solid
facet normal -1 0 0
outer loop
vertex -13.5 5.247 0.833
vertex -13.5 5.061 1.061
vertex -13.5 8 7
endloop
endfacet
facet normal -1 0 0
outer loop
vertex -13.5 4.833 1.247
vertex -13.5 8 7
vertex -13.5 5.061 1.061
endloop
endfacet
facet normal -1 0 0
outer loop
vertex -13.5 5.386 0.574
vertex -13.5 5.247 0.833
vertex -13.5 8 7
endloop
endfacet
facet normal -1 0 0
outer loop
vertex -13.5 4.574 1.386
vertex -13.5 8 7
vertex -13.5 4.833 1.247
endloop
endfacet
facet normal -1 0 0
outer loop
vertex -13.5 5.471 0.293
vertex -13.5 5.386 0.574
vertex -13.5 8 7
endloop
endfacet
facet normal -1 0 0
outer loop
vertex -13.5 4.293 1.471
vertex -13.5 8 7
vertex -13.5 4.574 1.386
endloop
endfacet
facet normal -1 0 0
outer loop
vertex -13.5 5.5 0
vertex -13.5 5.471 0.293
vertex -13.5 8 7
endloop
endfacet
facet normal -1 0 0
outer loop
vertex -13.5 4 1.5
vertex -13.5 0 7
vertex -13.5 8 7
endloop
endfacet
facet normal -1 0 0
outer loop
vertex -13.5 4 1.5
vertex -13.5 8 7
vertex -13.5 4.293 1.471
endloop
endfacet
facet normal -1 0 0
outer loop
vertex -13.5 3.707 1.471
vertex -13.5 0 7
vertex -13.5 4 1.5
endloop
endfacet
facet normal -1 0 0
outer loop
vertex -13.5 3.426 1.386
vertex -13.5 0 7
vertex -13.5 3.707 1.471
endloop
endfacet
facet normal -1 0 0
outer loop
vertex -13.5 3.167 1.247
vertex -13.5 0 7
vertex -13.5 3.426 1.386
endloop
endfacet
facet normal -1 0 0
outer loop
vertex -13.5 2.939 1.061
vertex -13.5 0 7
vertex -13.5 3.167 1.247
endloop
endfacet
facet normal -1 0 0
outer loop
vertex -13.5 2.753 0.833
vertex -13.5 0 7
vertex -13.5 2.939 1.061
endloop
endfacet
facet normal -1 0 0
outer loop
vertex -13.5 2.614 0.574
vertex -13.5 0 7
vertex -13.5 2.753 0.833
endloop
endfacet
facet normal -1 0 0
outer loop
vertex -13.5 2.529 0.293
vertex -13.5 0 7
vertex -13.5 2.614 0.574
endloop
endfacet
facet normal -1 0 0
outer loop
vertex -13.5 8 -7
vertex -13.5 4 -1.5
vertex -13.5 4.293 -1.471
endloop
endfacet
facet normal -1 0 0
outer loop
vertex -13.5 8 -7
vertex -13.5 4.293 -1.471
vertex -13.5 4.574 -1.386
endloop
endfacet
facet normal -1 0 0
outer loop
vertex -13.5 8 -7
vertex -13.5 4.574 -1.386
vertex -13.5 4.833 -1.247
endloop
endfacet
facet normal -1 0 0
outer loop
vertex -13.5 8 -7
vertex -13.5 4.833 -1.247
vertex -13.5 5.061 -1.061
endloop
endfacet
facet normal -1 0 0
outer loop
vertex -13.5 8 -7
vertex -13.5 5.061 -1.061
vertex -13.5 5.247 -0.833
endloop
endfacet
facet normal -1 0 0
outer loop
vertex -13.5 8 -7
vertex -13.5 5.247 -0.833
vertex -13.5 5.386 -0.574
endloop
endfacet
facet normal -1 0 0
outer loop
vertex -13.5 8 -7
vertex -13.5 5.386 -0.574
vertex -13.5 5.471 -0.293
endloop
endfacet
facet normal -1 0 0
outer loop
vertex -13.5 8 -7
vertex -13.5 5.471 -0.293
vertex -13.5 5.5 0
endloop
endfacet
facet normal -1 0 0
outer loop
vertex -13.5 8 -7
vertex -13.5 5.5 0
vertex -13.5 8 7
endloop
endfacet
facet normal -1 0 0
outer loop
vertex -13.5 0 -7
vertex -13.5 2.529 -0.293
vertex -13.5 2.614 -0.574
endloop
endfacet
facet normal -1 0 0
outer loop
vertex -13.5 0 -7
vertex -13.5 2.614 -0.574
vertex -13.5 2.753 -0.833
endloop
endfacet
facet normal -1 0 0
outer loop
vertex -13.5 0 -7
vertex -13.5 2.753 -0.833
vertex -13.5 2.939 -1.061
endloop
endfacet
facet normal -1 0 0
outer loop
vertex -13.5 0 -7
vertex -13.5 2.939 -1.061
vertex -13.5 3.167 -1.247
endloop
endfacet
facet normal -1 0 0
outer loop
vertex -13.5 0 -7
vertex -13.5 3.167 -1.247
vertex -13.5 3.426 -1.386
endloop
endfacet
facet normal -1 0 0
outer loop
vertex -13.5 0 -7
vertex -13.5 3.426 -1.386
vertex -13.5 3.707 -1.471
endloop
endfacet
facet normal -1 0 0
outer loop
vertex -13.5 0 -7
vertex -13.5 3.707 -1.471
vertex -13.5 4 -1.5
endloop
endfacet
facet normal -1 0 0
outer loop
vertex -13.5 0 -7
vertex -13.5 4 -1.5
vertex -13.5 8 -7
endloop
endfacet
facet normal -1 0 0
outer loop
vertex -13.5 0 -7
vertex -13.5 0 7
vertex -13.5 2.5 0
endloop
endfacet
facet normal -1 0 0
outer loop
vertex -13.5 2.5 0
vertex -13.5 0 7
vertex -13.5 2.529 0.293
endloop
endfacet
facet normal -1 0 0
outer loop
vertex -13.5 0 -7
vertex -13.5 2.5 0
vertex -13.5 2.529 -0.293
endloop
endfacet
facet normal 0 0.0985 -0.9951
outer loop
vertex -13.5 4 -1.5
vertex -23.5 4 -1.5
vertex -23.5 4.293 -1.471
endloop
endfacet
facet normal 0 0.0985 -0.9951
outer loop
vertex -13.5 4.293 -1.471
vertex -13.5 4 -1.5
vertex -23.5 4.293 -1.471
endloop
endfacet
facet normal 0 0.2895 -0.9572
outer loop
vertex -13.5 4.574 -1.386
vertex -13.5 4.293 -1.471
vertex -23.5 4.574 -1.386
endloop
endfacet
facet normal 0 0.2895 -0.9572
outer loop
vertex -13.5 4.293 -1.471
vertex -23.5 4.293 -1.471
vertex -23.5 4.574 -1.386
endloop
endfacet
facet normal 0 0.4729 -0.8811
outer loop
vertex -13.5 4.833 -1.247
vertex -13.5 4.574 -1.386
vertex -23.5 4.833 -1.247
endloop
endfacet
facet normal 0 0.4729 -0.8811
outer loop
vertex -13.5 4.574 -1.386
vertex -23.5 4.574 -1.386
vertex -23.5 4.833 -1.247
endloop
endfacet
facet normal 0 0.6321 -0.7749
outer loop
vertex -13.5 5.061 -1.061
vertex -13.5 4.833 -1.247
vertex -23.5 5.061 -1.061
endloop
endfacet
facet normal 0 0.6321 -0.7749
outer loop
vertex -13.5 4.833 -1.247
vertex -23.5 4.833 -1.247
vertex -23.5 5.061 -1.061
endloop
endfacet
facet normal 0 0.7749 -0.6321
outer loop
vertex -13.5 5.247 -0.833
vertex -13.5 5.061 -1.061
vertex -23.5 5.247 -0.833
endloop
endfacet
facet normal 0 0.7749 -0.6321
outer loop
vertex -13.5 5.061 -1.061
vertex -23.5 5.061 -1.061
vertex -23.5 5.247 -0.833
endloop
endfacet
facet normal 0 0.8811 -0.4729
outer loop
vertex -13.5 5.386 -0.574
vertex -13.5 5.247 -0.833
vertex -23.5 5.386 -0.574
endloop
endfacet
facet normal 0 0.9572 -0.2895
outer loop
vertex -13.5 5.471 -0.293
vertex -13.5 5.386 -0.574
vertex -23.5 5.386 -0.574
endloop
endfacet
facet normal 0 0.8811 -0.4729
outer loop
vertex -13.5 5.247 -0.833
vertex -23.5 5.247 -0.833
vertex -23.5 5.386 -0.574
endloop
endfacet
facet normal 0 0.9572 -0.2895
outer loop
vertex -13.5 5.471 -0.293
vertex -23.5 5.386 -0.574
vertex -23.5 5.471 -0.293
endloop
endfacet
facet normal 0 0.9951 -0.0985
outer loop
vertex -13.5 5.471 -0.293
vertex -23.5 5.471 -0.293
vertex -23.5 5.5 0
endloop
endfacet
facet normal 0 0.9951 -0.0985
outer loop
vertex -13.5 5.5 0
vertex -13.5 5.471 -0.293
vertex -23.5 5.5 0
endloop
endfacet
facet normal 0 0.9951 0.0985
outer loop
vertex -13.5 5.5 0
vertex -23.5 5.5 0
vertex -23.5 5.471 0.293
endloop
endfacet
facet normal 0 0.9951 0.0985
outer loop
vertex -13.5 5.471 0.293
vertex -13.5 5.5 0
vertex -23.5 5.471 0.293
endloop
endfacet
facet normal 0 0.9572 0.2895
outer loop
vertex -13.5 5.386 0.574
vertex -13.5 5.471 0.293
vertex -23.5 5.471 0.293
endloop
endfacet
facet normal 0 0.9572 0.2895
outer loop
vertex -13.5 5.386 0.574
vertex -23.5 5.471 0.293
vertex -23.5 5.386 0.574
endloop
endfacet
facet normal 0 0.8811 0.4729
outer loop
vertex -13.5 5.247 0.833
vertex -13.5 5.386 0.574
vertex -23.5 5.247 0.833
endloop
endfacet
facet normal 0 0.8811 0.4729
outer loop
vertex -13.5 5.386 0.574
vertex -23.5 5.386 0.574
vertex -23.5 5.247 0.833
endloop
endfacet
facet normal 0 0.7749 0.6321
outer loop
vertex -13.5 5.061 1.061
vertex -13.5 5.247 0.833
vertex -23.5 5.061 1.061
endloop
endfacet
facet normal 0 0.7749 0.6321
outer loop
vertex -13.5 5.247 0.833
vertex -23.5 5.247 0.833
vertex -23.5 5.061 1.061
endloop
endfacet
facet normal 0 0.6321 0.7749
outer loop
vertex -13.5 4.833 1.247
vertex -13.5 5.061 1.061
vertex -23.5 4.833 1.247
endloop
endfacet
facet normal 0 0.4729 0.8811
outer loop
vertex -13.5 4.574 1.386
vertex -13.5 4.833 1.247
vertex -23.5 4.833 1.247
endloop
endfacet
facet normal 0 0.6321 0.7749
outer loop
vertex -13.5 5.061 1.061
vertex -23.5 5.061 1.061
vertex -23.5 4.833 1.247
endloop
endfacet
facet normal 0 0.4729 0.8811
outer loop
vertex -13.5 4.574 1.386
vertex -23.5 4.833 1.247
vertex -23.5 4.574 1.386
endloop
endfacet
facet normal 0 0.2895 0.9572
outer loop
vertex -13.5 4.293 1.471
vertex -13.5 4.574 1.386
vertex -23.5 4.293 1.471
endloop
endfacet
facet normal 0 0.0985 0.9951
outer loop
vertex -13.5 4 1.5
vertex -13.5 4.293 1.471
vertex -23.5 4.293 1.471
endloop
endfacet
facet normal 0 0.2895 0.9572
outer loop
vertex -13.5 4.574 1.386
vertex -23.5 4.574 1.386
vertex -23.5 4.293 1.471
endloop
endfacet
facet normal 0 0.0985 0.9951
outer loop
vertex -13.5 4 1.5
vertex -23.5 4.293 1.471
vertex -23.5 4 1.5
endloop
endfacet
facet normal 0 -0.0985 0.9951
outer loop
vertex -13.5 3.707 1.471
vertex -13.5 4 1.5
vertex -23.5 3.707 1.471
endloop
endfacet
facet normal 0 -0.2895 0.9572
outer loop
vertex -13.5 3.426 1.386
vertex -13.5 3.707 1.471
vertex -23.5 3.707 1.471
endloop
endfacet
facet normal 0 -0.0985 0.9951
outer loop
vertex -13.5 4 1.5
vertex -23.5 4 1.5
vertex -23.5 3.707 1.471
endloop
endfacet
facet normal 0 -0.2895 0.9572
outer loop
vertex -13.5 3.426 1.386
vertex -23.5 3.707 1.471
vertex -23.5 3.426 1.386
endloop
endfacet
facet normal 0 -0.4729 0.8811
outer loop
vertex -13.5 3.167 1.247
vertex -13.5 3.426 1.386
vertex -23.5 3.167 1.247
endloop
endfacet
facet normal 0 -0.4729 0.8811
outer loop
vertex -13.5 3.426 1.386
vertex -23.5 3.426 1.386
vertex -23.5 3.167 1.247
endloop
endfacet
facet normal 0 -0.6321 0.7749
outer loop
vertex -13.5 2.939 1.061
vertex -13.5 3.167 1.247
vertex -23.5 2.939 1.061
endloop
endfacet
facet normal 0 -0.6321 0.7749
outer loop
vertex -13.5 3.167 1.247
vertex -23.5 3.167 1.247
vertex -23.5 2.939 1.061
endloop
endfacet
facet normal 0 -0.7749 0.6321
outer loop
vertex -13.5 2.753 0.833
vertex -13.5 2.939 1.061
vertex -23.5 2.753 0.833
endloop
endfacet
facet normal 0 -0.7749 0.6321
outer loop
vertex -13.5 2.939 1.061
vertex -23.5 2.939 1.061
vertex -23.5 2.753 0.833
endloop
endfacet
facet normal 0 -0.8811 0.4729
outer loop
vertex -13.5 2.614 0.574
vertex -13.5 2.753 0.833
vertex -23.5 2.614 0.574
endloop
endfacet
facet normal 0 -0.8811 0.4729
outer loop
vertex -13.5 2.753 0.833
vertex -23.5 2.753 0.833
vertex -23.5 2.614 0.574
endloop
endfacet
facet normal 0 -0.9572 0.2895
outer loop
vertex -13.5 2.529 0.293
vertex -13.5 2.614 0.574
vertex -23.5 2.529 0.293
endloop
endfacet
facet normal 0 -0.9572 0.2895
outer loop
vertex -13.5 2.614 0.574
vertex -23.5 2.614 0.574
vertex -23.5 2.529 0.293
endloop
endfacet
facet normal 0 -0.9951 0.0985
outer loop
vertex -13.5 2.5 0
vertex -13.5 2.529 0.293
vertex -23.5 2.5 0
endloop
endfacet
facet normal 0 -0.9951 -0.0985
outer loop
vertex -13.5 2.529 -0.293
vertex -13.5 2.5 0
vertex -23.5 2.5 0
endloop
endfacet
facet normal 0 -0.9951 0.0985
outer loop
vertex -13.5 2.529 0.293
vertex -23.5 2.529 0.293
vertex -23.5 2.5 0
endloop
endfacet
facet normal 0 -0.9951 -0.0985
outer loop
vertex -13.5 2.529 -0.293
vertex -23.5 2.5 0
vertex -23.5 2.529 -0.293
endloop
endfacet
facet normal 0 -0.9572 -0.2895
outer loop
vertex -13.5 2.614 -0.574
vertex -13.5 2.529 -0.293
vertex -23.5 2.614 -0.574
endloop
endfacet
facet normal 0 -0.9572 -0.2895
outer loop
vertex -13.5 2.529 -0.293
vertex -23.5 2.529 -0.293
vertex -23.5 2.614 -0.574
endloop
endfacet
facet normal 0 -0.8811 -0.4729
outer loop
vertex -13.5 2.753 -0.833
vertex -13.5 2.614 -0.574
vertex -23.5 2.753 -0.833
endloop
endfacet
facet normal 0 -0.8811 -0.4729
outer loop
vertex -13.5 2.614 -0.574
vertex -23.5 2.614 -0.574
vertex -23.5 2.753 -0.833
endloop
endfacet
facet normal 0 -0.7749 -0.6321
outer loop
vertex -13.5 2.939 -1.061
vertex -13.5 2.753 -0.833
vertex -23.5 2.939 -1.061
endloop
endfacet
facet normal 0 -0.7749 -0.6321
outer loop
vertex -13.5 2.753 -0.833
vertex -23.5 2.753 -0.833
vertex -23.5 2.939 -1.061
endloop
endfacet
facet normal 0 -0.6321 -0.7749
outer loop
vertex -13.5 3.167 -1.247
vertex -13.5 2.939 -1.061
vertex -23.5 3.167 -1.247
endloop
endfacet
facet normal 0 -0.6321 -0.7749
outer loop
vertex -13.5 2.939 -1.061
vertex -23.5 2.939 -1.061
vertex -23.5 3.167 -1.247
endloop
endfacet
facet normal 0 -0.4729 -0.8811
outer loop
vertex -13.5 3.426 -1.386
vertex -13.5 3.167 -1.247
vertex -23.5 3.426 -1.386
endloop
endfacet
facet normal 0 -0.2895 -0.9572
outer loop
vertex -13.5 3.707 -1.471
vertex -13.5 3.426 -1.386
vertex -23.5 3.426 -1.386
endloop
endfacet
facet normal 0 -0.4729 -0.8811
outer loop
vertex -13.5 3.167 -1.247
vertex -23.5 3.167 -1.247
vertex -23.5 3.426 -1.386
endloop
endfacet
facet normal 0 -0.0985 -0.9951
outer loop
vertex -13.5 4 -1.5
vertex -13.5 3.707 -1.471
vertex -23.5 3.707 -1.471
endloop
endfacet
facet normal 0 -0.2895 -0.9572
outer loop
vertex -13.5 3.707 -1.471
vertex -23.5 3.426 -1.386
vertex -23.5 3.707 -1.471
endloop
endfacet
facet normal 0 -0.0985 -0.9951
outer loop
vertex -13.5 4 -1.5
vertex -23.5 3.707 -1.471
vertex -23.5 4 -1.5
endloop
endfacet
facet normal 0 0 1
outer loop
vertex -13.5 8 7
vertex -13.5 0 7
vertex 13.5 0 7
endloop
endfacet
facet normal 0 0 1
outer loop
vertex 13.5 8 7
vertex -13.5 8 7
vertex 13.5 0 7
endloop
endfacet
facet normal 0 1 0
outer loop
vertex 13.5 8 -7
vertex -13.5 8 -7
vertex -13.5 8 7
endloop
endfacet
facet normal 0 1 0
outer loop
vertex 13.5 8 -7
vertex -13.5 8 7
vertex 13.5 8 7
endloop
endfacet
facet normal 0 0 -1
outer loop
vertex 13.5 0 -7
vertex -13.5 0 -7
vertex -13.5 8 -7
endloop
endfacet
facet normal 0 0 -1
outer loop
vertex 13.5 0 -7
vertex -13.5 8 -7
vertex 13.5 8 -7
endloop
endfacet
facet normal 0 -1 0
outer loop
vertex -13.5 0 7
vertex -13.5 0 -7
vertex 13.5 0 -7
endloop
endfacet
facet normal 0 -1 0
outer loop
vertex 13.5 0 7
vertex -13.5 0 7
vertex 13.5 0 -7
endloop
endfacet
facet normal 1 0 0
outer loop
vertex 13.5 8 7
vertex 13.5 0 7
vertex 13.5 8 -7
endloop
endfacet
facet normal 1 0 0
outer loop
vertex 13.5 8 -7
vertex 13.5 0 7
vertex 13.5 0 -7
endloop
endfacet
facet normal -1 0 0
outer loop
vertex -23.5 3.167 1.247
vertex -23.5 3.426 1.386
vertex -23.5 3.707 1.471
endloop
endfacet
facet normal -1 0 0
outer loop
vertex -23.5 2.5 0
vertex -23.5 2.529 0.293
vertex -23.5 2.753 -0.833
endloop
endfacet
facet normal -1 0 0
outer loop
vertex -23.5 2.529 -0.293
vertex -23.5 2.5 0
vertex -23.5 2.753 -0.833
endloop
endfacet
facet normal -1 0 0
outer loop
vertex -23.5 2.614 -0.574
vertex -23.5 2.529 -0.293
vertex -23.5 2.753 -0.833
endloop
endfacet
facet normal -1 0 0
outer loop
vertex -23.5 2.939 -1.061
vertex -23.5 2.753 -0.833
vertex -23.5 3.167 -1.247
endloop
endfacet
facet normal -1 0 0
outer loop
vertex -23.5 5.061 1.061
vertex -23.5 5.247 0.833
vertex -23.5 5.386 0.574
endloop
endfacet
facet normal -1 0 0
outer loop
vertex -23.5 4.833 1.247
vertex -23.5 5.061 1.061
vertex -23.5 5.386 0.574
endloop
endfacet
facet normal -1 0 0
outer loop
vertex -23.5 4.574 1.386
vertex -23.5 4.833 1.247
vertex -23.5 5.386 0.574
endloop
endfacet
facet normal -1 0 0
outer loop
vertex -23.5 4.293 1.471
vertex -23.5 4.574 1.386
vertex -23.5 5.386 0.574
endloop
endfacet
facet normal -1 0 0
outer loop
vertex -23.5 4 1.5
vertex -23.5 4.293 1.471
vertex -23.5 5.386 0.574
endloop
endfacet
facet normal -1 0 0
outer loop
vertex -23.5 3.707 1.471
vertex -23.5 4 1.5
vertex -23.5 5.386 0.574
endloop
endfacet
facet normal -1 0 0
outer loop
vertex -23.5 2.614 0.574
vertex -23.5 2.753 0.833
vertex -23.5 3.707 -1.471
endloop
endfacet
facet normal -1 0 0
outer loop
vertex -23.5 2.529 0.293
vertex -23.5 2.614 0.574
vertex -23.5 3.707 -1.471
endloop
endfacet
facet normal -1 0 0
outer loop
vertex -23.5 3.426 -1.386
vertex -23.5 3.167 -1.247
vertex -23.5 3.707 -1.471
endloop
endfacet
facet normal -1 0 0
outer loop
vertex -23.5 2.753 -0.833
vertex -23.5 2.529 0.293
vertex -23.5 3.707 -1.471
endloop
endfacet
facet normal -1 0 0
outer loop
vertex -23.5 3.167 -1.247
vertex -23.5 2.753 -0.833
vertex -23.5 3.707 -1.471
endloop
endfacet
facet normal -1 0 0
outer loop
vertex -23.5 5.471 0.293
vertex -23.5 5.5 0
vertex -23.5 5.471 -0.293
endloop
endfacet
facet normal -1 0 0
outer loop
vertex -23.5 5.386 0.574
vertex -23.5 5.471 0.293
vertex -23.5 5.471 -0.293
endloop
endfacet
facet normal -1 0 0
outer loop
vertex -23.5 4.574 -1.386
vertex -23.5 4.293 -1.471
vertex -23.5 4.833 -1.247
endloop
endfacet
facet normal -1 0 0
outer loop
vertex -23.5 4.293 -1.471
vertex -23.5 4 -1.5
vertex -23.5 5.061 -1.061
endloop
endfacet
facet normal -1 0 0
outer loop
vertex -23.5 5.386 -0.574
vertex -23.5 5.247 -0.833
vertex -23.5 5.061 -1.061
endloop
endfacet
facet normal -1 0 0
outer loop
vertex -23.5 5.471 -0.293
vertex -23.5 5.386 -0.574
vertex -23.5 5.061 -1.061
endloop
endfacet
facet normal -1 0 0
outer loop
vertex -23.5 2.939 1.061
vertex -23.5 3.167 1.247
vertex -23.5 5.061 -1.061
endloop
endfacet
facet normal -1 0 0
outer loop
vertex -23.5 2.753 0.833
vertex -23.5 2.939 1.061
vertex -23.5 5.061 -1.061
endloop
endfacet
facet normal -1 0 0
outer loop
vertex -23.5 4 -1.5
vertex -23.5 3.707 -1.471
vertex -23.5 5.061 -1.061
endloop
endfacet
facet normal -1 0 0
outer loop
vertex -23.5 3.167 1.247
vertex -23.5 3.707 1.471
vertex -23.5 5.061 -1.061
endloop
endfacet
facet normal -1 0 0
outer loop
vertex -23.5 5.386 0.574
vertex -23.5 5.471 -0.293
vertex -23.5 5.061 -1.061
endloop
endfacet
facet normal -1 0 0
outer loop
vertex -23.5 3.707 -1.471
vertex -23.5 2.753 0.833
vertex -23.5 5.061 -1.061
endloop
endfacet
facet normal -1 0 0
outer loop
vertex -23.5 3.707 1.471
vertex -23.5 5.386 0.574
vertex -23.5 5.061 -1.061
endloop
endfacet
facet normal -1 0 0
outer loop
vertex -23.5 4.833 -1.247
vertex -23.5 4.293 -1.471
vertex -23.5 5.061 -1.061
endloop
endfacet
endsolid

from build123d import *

# Parameters (mm, degrees)
SKETCH1_W       = 27
SKETCH1_H       = 14
HOUSING_DEPTH   = 8
WIRE_STUB_START = -23.5
SKETCH2_R       = 1.5
WIRE_STUB_DEPTH = 10


with BuildPart() as part:
    # Sketch1 → Housing (new body)
    with BuildSketch(Plane(origin=(0, 0, 0), x_dir=(1, 0, 0), z_dir=(0, 1, 0))):
        Rectangle(SKETCH1_W, SKETCH1_H)
    extrude(amount=HOUSING_DEPTH)

    # Sketch2 → Wire_Stub (add)
    with BuildSketch(Plane(origin=(0, 0, 0), x_dir=(0, 0, -1), z_dir=(1, 0, 0)).offset(WIRE_STUB_START)):
        with Locations((0, 4)):
            Circle(SKETCH2_R)
    extrude(amount=WIRE_STUB_DEPTH)


solid = part.part
